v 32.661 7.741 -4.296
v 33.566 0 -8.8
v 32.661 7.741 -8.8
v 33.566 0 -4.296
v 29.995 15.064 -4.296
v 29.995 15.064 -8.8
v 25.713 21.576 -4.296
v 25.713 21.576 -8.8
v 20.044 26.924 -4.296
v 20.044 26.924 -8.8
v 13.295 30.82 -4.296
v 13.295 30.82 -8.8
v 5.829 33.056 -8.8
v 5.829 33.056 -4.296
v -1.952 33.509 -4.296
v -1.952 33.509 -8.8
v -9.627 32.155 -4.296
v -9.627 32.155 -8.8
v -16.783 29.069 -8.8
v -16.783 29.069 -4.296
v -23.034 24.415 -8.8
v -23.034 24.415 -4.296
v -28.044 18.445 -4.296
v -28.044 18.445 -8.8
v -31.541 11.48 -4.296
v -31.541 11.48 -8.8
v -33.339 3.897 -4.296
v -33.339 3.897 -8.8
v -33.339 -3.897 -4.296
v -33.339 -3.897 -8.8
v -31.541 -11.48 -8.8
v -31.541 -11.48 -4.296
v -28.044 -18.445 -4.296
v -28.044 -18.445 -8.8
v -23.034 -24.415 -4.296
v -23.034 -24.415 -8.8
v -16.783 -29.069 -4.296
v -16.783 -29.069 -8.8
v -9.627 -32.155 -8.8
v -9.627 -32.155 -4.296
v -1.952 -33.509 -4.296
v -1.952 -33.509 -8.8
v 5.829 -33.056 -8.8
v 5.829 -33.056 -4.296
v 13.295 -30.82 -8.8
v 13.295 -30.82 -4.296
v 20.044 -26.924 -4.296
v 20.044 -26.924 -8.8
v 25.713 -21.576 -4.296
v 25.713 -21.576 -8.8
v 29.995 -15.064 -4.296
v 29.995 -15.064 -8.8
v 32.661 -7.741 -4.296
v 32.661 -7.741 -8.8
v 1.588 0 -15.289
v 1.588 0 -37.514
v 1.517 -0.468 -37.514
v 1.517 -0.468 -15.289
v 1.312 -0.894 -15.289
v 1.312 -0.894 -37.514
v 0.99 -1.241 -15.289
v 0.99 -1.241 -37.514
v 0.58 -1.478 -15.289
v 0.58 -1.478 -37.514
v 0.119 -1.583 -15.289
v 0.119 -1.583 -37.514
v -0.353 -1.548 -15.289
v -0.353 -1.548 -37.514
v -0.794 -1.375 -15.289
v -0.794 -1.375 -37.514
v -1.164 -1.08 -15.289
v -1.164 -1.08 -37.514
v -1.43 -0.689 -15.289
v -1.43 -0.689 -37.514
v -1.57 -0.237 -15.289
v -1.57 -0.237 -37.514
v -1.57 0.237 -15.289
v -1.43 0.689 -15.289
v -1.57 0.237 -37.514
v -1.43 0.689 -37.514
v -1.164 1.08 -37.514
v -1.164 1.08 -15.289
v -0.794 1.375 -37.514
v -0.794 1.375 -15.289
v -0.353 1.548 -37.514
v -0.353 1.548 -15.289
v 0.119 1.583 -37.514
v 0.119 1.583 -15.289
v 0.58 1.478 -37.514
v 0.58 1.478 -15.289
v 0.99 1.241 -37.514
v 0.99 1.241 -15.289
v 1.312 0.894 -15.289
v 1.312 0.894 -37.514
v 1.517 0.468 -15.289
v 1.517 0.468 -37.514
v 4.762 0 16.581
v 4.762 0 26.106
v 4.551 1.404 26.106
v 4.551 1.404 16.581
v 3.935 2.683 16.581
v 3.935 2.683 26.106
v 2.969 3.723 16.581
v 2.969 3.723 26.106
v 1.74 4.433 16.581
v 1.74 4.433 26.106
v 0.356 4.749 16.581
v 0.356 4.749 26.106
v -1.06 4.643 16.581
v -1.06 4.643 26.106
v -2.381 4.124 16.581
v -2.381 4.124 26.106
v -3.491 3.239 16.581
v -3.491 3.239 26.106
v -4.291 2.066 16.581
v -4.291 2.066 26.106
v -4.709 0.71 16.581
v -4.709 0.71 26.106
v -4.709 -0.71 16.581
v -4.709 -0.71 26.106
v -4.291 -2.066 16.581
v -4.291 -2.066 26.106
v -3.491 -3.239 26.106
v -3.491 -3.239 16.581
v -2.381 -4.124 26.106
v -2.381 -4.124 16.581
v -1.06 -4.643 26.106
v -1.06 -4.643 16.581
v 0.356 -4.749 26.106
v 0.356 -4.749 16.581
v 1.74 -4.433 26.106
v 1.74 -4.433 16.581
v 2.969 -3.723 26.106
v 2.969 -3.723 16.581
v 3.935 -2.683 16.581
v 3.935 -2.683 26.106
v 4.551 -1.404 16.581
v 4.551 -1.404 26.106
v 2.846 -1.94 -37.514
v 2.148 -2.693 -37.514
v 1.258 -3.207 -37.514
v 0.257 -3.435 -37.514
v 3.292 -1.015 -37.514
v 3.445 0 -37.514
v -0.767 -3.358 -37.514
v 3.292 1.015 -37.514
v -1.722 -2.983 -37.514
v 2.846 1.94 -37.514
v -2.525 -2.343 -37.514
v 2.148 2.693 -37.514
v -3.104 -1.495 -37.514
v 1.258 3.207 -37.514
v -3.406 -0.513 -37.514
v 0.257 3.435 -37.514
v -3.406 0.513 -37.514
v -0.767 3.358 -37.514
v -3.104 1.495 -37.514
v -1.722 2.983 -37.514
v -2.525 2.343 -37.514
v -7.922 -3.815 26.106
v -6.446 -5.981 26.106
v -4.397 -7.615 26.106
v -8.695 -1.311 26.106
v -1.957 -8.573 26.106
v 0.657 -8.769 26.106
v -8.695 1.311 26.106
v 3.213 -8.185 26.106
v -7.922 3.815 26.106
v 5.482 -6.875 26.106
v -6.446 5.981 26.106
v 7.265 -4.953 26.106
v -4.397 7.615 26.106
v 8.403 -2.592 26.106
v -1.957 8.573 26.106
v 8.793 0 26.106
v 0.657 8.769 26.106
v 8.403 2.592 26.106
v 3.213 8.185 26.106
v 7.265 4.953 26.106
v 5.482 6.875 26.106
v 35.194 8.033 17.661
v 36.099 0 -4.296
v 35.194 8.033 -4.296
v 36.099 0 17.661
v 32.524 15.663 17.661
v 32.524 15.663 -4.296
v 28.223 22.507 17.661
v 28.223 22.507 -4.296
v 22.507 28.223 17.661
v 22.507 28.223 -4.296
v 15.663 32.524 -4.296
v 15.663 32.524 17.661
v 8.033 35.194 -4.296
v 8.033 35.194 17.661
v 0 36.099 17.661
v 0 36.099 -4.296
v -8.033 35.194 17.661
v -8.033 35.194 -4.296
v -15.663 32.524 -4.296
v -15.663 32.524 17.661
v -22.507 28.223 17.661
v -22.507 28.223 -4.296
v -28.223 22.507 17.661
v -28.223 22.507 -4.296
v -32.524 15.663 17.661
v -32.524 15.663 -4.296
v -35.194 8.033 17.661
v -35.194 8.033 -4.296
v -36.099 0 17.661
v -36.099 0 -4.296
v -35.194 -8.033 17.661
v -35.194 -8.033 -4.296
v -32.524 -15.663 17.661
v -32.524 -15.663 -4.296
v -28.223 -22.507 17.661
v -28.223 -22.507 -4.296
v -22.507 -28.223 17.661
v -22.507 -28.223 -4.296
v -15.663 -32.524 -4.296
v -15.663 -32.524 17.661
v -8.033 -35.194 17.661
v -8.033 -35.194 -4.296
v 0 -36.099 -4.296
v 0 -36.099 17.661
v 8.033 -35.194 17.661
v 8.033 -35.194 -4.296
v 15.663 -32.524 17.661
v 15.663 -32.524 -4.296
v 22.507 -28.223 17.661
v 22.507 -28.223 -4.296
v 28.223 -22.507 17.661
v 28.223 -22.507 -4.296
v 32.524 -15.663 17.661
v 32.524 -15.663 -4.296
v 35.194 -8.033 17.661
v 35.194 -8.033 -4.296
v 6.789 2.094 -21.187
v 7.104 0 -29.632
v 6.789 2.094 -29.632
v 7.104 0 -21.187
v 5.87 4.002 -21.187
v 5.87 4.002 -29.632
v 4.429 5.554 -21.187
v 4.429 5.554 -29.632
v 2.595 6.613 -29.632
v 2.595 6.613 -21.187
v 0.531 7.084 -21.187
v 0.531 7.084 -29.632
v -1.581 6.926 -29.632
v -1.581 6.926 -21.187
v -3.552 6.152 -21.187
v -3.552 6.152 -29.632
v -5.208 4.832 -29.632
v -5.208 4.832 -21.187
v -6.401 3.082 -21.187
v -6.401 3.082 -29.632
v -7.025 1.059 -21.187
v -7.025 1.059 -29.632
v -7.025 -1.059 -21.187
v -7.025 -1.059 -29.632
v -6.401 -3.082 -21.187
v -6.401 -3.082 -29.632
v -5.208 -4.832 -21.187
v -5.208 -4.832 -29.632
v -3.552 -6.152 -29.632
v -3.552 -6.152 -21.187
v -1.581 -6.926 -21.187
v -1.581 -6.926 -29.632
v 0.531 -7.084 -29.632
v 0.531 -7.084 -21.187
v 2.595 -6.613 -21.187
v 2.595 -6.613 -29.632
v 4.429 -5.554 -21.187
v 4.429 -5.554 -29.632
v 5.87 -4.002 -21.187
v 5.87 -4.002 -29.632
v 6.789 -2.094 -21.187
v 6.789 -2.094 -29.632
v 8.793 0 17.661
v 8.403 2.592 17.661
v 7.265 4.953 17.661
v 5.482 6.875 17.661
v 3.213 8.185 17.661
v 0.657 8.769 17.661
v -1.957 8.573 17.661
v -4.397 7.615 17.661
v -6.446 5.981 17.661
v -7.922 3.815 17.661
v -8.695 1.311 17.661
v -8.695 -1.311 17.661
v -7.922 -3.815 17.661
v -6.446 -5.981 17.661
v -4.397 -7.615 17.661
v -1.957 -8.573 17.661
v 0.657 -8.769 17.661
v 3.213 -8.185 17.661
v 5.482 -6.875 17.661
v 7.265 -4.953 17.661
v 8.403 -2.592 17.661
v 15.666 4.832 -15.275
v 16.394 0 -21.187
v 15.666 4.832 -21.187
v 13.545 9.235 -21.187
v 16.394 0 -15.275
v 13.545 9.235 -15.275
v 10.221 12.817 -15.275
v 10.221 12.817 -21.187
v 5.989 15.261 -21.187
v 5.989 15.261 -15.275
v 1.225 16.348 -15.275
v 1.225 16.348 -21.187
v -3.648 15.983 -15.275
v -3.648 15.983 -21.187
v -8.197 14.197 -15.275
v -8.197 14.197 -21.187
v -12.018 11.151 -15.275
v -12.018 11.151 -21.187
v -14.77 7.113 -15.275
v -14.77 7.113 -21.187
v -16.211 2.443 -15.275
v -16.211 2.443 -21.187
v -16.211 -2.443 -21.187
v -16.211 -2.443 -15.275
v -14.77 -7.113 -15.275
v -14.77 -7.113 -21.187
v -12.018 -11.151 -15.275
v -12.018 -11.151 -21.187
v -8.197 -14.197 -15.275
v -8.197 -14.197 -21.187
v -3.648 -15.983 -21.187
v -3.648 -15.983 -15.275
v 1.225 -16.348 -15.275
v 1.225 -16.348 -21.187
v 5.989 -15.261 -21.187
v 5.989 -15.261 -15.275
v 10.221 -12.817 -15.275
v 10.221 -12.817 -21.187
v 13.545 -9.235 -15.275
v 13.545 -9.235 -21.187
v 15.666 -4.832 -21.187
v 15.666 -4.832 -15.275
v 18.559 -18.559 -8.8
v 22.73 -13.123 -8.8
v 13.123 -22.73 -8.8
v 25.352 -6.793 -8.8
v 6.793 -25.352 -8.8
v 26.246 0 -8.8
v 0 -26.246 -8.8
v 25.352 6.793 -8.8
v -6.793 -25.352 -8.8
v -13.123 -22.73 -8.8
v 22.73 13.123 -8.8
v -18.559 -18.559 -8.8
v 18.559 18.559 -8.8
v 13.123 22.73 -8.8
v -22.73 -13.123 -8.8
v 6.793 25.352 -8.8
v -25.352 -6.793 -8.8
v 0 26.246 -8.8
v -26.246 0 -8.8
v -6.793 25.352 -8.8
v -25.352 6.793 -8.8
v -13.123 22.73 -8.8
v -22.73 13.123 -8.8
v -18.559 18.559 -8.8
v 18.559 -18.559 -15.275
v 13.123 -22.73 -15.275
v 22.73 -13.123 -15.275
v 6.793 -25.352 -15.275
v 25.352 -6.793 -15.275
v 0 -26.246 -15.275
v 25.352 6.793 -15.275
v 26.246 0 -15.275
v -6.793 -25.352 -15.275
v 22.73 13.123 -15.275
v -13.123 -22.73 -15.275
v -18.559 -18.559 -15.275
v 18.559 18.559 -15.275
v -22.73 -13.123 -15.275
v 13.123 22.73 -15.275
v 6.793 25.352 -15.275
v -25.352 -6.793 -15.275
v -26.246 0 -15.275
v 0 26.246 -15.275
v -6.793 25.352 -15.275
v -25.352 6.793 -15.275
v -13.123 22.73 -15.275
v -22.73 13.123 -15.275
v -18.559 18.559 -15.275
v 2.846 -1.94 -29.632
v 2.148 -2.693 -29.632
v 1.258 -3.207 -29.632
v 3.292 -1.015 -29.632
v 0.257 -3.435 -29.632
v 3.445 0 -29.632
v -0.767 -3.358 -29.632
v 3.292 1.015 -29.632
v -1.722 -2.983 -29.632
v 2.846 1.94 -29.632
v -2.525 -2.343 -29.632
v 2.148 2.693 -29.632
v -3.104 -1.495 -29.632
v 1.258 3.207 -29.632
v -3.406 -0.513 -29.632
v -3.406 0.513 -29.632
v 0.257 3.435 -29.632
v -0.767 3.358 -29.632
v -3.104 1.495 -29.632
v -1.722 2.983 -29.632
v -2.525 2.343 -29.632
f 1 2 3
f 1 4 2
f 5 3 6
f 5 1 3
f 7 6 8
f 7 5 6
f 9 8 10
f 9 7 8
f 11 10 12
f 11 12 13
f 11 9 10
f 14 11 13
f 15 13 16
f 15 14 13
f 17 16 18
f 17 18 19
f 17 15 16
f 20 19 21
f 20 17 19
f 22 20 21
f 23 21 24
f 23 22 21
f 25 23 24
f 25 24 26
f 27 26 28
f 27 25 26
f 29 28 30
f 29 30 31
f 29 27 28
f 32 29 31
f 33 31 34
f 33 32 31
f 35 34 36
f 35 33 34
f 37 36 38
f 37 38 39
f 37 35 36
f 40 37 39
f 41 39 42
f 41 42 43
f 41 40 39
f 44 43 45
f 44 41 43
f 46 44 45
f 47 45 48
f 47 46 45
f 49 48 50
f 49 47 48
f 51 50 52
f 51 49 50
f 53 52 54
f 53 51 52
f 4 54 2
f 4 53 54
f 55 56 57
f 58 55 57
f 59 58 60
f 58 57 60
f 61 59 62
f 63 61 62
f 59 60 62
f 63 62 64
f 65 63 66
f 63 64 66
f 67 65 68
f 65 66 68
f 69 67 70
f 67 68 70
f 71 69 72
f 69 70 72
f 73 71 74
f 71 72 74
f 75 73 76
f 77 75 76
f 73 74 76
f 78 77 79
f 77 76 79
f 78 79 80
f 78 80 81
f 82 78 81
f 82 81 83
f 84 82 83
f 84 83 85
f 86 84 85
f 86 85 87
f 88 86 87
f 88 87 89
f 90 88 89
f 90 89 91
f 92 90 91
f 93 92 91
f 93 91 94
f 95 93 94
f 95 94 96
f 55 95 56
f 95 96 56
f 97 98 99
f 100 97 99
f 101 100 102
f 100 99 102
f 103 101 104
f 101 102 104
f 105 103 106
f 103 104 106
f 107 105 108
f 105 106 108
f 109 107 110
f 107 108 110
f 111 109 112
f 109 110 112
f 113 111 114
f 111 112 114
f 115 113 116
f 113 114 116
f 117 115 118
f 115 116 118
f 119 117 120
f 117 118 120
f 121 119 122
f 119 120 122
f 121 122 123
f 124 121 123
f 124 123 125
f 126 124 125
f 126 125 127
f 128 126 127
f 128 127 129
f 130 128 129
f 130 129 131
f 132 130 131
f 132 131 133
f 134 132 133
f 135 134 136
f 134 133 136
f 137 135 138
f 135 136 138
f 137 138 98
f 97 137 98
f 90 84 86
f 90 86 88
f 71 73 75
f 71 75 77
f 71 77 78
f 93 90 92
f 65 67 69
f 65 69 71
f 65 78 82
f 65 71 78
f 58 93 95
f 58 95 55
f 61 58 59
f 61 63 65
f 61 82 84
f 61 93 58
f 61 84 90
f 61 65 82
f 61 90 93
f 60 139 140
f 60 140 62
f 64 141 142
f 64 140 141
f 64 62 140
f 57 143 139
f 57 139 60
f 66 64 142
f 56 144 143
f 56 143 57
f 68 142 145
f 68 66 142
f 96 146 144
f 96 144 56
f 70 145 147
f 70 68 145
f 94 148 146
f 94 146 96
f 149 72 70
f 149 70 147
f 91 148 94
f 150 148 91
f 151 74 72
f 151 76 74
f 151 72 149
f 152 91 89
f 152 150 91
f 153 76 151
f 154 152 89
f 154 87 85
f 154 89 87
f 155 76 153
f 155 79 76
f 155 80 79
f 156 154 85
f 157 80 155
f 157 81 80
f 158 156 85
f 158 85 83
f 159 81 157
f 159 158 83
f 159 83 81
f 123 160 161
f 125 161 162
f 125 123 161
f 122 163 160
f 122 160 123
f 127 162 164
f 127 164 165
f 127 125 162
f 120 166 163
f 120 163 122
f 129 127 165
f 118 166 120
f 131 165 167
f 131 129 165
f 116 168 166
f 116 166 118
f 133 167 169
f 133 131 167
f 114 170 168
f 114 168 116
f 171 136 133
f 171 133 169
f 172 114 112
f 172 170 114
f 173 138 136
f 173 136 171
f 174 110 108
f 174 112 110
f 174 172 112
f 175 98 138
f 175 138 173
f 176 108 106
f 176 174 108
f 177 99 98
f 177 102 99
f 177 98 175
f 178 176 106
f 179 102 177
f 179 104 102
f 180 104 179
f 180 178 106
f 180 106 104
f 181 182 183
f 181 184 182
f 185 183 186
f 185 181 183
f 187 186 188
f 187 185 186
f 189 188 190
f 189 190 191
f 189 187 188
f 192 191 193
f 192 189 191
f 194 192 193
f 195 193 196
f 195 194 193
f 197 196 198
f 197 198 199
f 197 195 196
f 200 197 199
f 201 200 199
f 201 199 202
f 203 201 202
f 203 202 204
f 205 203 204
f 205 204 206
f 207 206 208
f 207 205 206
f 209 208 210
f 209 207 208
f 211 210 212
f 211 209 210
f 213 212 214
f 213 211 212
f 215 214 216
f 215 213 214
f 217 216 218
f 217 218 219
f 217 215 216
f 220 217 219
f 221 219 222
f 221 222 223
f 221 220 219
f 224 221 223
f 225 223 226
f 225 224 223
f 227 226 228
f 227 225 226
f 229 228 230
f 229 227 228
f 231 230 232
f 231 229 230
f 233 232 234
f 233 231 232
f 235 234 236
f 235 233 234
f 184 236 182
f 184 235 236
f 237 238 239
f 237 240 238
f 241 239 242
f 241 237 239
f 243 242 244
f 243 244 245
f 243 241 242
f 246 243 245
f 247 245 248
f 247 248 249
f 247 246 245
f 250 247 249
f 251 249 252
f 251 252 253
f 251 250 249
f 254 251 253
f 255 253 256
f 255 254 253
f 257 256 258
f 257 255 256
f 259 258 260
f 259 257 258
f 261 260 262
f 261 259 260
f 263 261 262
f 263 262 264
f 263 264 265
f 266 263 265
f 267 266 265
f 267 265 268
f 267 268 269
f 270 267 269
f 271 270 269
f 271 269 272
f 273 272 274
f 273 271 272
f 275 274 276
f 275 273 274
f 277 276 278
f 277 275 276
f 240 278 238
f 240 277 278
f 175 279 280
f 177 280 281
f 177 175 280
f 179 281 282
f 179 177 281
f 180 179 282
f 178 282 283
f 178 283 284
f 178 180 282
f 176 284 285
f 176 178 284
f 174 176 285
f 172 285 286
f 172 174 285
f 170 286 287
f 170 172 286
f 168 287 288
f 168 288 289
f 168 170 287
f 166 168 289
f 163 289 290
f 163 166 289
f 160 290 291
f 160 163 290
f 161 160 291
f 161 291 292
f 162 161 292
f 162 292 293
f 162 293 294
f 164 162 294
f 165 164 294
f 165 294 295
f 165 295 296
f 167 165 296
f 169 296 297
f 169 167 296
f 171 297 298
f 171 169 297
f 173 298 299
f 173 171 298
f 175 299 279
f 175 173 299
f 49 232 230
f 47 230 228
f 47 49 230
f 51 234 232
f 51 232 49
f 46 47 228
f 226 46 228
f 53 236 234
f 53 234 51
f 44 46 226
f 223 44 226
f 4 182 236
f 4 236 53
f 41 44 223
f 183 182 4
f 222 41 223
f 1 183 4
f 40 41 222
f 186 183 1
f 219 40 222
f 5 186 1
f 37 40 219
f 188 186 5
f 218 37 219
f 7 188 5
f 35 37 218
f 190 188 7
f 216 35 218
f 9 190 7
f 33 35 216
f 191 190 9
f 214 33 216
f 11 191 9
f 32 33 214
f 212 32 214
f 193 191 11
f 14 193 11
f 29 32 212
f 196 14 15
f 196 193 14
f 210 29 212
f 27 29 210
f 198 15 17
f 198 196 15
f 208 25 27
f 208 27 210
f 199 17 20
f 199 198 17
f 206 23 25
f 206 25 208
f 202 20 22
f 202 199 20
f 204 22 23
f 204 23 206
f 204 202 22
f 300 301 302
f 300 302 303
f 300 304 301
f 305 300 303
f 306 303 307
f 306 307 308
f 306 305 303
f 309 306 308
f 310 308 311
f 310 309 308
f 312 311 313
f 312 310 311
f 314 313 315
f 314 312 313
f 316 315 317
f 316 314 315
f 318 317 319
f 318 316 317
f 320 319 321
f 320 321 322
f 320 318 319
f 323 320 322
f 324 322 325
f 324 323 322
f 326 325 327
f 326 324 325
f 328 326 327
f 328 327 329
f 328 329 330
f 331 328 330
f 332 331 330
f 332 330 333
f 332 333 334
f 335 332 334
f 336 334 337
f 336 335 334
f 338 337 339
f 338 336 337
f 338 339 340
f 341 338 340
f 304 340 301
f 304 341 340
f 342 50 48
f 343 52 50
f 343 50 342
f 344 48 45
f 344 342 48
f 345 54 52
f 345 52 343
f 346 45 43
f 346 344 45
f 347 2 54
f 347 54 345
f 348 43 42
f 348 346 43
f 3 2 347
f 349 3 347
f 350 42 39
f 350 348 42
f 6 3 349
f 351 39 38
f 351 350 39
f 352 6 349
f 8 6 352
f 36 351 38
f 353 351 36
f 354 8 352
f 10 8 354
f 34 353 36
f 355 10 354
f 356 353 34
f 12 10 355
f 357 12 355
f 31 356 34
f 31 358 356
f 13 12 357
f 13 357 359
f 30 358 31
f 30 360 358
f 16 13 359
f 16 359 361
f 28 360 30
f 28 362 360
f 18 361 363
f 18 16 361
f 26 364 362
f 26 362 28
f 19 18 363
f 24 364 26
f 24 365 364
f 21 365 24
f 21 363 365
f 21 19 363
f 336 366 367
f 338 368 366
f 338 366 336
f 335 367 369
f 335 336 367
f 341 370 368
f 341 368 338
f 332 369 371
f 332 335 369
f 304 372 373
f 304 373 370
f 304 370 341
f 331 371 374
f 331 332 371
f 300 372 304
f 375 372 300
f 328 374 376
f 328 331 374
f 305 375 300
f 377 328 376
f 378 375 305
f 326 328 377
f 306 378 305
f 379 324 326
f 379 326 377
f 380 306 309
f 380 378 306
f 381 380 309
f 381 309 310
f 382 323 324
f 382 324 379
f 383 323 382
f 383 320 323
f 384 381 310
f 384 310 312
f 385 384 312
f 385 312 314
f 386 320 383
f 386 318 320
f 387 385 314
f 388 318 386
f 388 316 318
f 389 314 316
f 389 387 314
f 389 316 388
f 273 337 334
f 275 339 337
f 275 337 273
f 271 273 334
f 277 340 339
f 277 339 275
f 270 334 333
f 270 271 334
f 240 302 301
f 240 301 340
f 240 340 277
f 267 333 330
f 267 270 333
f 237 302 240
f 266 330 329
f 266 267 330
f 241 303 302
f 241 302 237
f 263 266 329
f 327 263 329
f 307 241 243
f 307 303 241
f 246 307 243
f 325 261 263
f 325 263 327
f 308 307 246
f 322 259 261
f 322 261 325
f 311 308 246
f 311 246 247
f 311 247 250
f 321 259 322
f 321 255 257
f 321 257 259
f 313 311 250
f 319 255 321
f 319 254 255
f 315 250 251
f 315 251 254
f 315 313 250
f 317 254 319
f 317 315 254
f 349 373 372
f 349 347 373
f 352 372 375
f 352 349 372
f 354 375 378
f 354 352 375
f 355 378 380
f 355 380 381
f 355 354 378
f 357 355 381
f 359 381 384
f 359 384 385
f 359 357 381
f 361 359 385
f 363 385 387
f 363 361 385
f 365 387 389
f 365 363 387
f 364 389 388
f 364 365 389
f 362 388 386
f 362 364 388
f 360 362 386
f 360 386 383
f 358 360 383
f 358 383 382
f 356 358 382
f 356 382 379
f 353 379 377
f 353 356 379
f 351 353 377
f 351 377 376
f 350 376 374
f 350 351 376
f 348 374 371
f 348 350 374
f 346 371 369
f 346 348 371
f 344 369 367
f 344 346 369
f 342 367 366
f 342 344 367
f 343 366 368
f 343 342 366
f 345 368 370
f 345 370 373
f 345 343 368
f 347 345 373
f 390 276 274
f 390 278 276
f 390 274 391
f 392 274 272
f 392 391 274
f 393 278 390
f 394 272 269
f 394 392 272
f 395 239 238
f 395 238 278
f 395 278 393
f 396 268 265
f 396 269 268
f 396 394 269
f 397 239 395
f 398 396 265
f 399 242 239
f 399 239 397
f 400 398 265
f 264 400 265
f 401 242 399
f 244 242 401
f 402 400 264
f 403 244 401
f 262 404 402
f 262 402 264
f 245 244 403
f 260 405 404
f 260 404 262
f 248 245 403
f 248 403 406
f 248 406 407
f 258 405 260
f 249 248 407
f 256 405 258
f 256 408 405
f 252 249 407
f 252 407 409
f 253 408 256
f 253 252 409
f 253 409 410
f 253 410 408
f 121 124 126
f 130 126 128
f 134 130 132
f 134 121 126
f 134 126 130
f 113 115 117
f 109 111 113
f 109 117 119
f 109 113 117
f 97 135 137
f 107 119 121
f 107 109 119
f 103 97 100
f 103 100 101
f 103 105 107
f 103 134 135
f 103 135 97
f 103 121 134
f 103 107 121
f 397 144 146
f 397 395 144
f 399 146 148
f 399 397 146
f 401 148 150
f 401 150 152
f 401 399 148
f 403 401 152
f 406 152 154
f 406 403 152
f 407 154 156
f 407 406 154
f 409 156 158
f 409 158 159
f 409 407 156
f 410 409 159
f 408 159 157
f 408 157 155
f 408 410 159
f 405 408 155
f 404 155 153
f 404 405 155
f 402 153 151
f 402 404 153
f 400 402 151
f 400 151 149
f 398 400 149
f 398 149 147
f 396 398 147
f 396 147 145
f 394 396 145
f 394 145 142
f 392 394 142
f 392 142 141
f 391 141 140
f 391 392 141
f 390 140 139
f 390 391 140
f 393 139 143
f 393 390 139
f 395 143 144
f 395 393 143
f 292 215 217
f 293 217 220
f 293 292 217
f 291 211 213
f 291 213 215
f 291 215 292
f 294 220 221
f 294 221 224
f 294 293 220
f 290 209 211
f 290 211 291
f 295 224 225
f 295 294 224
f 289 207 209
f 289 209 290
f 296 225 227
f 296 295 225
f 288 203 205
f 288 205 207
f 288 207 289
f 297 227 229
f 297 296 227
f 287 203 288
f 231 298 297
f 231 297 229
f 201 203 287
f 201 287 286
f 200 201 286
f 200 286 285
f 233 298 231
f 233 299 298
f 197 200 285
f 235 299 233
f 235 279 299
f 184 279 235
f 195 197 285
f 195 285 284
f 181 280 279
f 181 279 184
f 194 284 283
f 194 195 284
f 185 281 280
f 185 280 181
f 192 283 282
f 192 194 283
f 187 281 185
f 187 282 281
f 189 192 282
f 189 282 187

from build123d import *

# Parameters (mm, degrees)
F2_R     = 4.7625
F3_DEPTH = 9.525
F4_R     = 1.5875
F5_DEPTH = 22.225


with BuildPart() as f1:
    # F0 (on Front) → F1 (revolve)
    with BuildSketch(Plane.XZ):
        Polygon((8.793218, 26.10616), (0, 26.10616), (0, -37.513819), (3.444635, -37.513819), (3.444635, -29.631697), (7.104192, -29.631697), (7.104192, -21.186566), (16.393835, -21.186566), (16.393835, -15.274976), (26.246486, -15.274976), (26.246486, -8.800376), (33.565599, -8.800376), (33.565599, -4.296307), (36.099136, -4.296307), (36.099136, 17.661031), (8.793218, 17.661031), align=None)
    revolve(axis=Axis((0, 0, -5.703829), (0, 0, 1)))

    # F2 (on face) → F3 (cut)
    with BuildSketch(Plane.XY.offset(26.10616)):
        Circle(F2_R)
    extrude(amount=-F3_DEPTH, mode=Mode.SUBTRACT)

    # F4 (on face) → F5 (cut)
    with BuildSketch(Plane(origin=(0, 0, -37.513819), x_dir=(1, 0, 0), z_dir=(0, 0, -1))):
        Circle(F4_R)
    extrude(amount=-F5_DEPTH, mode=Mode.SUBTRACT)


solid = f1.part
